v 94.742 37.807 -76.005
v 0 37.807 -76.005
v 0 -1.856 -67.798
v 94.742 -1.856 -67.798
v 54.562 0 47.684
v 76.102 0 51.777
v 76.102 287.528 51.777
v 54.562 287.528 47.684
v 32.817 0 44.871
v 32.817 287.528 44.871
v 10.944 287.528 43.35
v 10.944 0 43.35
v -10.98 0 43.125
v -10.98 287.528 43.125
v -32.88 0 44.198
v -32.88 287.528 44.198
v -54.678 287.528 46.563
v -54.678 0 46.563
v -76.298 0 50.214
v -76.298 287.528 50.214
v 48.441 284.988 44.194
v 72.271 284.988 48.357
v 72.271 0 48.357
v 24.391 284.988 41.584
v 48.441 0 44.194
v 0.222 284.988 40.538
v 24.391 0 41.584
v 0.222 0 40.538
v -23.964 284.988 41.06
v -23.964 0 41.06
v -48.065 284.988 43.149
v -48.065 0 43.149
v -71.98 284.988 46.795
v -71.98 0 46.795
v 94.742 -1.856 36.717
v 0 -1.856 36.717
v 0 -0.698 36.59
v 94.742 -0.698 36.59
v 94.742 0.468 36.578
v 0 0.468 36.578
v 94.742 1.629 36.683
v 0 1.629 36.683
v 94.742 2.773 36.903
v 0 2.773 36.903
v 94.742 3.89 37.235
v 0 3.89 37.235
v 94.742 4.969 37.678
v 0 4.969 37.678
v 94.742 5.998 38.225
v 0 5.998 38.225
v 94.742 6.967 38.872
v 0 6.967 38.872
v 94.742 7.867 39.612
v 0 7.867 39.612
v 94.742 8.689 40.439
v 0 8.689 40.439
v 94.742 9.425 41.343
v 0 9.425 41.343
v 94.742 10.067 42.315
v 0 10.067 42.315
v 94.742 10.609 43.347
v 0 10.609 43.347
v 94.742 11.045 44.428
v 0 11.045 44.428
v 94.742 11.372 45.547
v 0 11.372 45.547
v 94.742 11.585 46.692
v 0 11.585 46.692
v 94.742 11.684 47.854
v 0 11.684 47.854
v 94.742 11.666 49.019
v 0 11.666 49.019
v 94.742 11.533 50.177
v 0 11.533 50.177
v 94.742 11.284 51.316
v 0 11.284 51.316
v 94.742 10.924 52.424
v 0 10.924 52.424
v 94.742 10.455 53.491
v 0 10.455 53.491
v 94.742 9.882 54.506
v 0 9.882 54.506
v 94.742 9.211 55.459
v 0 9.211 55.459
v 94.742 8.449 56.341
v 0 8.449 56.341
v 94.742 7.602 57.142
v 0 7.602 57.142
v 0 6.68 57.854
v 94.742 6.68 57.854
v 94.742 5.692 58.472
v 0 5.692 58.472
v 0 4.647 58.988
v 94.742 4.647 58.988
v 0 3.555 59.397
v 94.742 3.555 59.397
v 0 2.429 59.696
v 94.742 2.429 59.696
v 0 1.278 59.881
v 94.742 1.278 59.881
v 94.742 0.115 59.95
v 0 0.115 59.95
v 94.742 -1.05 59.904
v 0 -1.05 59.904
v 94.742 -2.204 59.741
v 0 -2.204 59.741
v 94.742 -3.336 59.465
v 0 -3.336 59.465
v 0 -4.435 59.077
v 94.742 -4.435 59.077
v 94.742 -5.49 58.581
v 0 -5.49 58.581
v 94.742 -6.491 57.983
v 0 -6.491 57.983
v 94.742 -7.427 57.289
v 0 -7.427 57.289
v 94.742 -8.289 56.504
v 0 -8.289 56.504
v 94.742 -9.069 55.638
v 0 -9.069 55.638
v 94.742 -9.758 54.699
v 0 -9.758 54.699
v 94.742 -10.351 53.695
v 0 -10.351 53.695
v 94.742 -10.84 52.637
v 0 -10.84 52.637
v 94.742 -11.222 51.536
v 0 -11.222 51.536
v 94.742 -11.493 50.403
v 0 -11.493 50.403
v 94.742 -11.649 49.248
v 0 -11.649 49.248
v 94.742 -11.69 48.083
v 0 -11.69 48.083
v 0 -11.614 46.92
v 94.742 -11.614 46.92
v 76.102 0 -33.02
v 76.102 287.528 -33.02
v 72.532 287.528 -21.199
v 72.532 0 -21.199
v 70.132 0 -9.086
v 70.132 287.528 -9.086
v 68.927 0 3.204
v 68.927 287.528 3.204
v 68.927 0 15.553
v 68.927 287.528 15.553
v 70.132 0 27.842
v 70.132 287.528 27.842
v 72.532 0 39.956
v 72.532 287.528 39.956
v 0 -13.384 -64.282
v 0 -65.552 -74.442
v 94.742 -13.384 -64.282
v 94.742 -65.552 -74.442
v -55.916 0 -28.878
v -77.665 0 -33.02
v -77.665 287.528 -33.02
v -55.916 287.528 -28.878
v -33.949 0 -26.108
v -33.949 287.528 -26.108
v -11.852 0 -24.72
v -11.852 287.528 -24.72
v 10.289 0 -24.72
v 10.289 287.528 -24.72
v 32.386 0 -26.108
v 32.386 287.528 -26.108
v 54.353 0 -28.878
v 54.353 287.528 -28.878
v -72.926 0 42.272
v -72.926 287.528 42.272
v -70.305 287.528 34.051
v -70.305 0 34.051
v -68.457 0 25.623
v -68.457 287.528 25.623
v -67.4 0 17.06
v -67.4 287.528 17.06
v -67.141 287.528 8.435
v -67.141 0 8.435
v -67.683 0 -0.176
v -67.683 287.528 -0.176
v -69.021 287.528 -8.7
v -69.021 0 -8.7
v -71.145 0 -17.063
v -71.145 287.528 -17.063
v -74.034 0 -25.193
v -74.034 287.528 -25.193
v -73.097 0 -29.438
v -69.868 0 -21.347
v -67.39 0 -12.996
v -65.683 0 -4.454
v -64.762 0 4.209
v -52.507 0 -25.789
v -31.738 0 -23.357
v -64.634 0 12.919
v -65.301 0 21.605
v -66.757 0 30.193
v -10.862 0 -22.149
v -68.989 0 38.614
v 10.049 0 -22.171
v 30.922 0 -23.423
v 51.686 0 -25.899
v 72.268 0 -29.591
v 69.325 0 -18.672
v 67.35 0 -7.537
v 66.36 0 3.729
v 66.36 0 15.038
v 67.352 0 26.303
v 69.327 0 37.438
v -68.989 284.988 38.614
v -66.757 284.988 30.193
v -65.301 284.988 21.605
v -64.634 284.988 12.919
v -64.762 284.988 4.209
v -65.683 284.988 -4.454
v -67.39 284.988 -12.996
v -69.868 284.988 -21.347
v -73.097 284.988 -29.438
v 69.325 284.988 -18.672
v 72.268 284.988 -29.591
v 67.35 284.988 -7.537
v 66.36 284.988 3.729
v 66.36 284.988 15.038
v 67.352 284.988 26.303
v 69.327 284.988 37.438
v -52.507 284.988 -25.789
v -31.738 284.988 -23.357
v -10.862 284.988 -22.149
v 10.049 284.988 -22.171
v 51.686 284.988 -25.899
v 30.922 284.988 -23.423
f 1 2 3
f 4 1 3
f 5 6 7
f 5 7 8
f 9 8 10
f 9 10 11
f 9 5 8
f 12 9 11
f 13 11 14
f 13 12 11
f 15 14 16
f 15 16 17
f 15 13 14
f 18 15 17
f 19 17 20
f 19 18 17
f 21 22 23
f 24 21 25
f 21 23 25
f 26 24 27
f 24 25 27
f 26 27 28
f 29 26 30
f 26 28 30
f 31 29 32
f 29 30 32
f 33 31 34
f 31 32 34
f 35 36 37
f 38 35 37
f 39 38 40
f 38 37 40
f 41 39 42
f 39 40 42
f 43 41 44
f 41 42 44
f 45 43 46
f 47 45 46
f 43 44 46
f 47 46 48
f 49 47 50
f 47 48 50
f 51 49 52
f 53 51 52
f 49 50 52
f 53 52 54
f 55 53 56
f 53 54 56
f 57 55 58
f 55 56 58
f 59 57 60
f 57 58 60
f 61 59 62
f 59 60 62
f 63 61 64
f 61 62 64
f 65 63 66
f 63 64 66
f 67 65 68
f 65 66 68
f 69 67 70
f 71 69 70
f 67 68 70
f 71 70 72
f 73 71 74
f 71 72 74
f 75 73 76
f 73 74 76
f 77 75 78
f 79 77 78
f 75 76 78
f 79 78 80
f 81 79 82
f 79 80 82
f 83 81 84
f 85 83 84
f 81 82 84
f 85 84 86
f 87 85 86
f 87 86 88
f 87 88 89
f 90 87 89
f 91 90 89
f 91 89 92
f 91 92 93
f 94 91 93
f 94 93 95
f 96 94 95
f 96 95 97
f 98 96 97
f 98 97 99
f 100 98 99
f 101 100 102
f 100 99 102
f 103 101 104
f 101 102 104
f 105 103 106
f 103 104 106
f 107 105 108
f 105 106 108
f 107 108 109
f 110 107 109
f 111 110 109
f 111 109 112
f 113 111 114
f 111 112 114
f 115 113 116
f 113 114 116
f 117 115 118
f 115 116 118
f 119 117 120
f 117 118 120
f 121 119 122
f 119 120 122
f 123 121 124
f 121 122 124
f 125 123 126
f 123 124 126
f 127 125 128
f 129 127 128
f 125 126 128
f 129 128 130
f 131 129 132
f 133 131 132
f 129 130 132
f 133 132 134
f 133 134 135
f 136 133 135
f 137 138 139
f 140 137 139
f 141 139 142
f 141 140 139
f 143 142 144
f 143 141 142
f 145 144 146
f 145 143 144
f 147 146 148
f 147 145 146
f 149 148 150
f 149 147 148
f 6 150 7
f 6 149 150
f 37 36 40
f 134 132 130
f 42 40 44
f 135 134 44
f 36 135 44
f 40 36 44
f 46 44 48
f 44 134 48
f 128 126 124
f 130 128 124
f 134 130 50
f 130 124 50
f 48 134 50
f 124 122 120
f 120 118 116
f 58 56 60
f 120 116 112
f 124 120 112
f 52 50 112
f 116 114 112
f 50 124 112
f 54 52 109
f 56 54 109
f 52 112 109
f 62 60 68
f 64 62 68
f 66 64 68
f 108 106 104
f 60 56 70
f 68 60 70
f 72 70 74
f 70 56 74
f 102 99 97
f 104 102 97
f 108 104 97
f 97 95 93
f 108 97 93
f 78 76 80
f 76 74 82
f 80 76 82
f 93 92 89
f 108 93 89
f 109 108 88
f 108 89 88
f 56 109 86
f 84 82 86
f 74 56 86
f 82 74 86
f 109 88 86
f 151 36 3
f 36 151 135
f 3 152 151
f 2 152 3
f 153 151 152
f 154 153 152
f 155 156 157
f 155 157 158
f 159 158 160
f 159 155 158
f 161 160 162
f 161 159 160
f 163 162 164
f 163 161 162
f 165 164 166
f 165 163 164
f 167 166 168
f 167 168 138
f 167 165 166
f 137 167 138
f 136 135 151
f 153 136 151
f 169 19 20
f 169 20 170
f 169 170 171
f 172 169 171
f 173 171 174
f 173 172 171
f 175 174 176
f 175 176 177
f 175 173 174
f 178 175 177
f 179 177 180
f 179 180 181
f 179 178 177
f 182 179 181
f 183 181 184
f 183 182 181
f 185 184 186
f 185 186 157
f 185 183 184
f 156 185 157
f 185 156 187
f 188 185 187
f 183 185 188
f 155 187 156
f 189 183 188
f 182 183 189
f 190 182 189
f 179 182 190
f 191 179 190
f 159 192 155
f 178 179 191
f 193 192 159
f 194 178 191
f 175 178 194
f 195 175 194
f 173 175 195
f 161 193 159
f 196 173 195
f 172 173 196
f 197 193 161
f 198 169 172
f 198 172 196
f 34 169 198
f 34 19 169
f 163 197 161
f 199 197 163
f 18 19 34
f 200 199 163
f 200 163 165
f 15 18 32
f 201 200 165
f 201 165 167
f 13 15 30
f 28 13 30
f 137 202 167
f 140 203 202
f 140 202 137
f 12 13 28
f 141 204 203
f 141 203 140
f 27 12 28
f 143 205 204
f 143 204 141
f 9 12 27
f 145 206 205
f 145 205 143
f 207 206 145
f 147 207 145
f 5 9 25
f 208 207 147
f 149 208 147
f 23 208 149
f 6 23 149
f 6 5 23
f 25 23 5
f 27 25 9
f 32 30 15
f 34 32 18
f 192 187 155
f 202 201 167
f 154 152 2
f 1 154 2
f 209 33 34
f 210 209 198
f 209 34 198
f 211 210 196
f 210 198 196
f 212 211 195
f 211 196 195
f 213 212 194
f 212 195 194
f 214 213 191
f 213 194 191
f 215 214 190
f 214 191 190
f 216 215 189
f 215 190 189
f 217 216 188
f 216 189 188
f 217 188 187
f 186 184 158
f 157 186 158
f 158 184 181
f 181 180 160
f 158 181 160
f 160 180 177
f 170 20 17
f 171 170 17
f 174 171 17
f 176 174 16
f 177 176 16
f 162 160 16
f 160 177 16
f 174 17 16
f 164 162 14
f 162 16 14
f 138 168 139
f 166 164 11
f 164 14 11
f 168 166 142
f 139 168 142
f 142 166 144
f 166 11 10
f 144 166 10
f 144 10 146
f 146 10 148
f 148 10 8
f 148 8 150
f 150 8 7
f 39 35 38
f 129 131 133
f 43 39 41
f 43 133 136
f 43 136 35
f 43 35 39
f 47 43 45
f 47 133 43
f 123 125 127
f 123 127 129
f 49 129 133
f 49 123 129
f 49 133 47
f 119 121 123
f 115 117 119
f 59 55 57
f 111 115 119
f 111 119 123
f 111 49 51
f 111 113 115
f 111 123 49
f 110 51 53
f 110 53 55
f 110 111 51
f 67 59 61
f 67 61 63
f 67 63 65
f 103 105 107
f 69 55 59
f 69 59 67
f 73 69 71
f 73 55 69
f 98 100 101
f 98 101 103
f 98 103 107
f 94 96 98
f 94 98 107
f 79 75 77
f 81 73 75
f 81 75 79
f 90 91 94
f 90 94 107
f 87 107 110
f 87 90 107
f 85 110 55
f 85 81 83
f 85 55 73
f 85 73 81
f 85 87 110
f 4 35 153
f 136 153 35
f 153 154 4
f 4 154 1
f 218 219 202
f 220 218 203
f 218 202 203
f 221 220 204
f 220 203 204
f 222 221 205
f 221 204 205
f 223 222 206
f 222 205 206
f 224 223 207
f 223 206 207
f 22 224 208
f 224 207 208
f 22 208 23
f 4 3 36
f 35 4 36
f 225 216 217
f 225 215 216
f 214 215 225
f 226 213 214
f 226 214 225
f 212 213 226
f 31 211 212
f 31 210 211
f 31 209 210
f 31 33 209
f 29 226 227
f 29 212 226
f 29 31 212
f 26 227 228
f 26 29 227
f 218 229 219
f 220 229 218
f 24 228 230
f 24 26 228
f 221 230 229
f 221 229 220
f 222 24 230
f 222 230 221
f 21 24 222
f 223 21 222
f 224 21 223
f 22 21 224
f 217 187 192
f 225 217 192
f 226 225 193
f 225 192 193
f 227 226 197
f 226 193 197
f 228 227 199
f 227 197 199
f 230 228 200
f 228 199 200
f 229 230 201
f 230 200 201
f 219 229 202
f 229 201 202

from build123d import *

# Parameters (mm, degrees)
F1_DEPTH = 287.528
F2_T     = -2.54
F4_DEPTH = 94.742


with BuildPart() as f1:
    # F0 (on Front) → F1 (new body)
    with BuildSketch(Plane.XZ):
        with BuildLine():
            ThreePointArc((76.102309, 51.776927), (-0.016463, 43.075618), (-76.297693, 50.213847))
            ThreePointArc((-76.297693, 50.213847), (-67.140959, 8.435223), (-77.665389, -33.020001))
            ThreePointArc((-77.665389, -33.020001), (-0.78154, -24.546425), (76.102309, -33.020001))
            ThreePointArc((76.102309, -33.020001), (68.77563, 9.378463), (76.102309, 51.776927))
        make_face()
    extrude(amount=-F1_DEPTH)

    # F2
    f2_openings = [f1.faces().sort_by_distance(p)[0] for p in [
        (0.781643, 0, 9.143892),
    ]]
    offset(amount=F2_T, openings=f2_openings)


with BuildPart() as f4:
    # F3 (on Right) → F4 (new body)
    with BuildSketch(Plane.YZ):
        with BuildLine():
            Line((-1.856153, -67.798465), (-1.856153, 36.717418))
            ThreePointArc((-1.856153, 36.717418), (8.448764, 56.340533), (-11.613795, 46.91972))
            Line((-11.613795, 46.91972), (-13.383849, -64.281538))
            Line((-13.383849, -64.281538), (-65.551534, -74.441537))
            Line((-65.551534, -74.441537), (37.806924, -76.004617))
            Line((37.806924, -76.004617), (-1.856153, -67.798465))
        make_face()
    extrude(amount=F4_DEPTH)


solid = Compound([f1.part, f4.part])
